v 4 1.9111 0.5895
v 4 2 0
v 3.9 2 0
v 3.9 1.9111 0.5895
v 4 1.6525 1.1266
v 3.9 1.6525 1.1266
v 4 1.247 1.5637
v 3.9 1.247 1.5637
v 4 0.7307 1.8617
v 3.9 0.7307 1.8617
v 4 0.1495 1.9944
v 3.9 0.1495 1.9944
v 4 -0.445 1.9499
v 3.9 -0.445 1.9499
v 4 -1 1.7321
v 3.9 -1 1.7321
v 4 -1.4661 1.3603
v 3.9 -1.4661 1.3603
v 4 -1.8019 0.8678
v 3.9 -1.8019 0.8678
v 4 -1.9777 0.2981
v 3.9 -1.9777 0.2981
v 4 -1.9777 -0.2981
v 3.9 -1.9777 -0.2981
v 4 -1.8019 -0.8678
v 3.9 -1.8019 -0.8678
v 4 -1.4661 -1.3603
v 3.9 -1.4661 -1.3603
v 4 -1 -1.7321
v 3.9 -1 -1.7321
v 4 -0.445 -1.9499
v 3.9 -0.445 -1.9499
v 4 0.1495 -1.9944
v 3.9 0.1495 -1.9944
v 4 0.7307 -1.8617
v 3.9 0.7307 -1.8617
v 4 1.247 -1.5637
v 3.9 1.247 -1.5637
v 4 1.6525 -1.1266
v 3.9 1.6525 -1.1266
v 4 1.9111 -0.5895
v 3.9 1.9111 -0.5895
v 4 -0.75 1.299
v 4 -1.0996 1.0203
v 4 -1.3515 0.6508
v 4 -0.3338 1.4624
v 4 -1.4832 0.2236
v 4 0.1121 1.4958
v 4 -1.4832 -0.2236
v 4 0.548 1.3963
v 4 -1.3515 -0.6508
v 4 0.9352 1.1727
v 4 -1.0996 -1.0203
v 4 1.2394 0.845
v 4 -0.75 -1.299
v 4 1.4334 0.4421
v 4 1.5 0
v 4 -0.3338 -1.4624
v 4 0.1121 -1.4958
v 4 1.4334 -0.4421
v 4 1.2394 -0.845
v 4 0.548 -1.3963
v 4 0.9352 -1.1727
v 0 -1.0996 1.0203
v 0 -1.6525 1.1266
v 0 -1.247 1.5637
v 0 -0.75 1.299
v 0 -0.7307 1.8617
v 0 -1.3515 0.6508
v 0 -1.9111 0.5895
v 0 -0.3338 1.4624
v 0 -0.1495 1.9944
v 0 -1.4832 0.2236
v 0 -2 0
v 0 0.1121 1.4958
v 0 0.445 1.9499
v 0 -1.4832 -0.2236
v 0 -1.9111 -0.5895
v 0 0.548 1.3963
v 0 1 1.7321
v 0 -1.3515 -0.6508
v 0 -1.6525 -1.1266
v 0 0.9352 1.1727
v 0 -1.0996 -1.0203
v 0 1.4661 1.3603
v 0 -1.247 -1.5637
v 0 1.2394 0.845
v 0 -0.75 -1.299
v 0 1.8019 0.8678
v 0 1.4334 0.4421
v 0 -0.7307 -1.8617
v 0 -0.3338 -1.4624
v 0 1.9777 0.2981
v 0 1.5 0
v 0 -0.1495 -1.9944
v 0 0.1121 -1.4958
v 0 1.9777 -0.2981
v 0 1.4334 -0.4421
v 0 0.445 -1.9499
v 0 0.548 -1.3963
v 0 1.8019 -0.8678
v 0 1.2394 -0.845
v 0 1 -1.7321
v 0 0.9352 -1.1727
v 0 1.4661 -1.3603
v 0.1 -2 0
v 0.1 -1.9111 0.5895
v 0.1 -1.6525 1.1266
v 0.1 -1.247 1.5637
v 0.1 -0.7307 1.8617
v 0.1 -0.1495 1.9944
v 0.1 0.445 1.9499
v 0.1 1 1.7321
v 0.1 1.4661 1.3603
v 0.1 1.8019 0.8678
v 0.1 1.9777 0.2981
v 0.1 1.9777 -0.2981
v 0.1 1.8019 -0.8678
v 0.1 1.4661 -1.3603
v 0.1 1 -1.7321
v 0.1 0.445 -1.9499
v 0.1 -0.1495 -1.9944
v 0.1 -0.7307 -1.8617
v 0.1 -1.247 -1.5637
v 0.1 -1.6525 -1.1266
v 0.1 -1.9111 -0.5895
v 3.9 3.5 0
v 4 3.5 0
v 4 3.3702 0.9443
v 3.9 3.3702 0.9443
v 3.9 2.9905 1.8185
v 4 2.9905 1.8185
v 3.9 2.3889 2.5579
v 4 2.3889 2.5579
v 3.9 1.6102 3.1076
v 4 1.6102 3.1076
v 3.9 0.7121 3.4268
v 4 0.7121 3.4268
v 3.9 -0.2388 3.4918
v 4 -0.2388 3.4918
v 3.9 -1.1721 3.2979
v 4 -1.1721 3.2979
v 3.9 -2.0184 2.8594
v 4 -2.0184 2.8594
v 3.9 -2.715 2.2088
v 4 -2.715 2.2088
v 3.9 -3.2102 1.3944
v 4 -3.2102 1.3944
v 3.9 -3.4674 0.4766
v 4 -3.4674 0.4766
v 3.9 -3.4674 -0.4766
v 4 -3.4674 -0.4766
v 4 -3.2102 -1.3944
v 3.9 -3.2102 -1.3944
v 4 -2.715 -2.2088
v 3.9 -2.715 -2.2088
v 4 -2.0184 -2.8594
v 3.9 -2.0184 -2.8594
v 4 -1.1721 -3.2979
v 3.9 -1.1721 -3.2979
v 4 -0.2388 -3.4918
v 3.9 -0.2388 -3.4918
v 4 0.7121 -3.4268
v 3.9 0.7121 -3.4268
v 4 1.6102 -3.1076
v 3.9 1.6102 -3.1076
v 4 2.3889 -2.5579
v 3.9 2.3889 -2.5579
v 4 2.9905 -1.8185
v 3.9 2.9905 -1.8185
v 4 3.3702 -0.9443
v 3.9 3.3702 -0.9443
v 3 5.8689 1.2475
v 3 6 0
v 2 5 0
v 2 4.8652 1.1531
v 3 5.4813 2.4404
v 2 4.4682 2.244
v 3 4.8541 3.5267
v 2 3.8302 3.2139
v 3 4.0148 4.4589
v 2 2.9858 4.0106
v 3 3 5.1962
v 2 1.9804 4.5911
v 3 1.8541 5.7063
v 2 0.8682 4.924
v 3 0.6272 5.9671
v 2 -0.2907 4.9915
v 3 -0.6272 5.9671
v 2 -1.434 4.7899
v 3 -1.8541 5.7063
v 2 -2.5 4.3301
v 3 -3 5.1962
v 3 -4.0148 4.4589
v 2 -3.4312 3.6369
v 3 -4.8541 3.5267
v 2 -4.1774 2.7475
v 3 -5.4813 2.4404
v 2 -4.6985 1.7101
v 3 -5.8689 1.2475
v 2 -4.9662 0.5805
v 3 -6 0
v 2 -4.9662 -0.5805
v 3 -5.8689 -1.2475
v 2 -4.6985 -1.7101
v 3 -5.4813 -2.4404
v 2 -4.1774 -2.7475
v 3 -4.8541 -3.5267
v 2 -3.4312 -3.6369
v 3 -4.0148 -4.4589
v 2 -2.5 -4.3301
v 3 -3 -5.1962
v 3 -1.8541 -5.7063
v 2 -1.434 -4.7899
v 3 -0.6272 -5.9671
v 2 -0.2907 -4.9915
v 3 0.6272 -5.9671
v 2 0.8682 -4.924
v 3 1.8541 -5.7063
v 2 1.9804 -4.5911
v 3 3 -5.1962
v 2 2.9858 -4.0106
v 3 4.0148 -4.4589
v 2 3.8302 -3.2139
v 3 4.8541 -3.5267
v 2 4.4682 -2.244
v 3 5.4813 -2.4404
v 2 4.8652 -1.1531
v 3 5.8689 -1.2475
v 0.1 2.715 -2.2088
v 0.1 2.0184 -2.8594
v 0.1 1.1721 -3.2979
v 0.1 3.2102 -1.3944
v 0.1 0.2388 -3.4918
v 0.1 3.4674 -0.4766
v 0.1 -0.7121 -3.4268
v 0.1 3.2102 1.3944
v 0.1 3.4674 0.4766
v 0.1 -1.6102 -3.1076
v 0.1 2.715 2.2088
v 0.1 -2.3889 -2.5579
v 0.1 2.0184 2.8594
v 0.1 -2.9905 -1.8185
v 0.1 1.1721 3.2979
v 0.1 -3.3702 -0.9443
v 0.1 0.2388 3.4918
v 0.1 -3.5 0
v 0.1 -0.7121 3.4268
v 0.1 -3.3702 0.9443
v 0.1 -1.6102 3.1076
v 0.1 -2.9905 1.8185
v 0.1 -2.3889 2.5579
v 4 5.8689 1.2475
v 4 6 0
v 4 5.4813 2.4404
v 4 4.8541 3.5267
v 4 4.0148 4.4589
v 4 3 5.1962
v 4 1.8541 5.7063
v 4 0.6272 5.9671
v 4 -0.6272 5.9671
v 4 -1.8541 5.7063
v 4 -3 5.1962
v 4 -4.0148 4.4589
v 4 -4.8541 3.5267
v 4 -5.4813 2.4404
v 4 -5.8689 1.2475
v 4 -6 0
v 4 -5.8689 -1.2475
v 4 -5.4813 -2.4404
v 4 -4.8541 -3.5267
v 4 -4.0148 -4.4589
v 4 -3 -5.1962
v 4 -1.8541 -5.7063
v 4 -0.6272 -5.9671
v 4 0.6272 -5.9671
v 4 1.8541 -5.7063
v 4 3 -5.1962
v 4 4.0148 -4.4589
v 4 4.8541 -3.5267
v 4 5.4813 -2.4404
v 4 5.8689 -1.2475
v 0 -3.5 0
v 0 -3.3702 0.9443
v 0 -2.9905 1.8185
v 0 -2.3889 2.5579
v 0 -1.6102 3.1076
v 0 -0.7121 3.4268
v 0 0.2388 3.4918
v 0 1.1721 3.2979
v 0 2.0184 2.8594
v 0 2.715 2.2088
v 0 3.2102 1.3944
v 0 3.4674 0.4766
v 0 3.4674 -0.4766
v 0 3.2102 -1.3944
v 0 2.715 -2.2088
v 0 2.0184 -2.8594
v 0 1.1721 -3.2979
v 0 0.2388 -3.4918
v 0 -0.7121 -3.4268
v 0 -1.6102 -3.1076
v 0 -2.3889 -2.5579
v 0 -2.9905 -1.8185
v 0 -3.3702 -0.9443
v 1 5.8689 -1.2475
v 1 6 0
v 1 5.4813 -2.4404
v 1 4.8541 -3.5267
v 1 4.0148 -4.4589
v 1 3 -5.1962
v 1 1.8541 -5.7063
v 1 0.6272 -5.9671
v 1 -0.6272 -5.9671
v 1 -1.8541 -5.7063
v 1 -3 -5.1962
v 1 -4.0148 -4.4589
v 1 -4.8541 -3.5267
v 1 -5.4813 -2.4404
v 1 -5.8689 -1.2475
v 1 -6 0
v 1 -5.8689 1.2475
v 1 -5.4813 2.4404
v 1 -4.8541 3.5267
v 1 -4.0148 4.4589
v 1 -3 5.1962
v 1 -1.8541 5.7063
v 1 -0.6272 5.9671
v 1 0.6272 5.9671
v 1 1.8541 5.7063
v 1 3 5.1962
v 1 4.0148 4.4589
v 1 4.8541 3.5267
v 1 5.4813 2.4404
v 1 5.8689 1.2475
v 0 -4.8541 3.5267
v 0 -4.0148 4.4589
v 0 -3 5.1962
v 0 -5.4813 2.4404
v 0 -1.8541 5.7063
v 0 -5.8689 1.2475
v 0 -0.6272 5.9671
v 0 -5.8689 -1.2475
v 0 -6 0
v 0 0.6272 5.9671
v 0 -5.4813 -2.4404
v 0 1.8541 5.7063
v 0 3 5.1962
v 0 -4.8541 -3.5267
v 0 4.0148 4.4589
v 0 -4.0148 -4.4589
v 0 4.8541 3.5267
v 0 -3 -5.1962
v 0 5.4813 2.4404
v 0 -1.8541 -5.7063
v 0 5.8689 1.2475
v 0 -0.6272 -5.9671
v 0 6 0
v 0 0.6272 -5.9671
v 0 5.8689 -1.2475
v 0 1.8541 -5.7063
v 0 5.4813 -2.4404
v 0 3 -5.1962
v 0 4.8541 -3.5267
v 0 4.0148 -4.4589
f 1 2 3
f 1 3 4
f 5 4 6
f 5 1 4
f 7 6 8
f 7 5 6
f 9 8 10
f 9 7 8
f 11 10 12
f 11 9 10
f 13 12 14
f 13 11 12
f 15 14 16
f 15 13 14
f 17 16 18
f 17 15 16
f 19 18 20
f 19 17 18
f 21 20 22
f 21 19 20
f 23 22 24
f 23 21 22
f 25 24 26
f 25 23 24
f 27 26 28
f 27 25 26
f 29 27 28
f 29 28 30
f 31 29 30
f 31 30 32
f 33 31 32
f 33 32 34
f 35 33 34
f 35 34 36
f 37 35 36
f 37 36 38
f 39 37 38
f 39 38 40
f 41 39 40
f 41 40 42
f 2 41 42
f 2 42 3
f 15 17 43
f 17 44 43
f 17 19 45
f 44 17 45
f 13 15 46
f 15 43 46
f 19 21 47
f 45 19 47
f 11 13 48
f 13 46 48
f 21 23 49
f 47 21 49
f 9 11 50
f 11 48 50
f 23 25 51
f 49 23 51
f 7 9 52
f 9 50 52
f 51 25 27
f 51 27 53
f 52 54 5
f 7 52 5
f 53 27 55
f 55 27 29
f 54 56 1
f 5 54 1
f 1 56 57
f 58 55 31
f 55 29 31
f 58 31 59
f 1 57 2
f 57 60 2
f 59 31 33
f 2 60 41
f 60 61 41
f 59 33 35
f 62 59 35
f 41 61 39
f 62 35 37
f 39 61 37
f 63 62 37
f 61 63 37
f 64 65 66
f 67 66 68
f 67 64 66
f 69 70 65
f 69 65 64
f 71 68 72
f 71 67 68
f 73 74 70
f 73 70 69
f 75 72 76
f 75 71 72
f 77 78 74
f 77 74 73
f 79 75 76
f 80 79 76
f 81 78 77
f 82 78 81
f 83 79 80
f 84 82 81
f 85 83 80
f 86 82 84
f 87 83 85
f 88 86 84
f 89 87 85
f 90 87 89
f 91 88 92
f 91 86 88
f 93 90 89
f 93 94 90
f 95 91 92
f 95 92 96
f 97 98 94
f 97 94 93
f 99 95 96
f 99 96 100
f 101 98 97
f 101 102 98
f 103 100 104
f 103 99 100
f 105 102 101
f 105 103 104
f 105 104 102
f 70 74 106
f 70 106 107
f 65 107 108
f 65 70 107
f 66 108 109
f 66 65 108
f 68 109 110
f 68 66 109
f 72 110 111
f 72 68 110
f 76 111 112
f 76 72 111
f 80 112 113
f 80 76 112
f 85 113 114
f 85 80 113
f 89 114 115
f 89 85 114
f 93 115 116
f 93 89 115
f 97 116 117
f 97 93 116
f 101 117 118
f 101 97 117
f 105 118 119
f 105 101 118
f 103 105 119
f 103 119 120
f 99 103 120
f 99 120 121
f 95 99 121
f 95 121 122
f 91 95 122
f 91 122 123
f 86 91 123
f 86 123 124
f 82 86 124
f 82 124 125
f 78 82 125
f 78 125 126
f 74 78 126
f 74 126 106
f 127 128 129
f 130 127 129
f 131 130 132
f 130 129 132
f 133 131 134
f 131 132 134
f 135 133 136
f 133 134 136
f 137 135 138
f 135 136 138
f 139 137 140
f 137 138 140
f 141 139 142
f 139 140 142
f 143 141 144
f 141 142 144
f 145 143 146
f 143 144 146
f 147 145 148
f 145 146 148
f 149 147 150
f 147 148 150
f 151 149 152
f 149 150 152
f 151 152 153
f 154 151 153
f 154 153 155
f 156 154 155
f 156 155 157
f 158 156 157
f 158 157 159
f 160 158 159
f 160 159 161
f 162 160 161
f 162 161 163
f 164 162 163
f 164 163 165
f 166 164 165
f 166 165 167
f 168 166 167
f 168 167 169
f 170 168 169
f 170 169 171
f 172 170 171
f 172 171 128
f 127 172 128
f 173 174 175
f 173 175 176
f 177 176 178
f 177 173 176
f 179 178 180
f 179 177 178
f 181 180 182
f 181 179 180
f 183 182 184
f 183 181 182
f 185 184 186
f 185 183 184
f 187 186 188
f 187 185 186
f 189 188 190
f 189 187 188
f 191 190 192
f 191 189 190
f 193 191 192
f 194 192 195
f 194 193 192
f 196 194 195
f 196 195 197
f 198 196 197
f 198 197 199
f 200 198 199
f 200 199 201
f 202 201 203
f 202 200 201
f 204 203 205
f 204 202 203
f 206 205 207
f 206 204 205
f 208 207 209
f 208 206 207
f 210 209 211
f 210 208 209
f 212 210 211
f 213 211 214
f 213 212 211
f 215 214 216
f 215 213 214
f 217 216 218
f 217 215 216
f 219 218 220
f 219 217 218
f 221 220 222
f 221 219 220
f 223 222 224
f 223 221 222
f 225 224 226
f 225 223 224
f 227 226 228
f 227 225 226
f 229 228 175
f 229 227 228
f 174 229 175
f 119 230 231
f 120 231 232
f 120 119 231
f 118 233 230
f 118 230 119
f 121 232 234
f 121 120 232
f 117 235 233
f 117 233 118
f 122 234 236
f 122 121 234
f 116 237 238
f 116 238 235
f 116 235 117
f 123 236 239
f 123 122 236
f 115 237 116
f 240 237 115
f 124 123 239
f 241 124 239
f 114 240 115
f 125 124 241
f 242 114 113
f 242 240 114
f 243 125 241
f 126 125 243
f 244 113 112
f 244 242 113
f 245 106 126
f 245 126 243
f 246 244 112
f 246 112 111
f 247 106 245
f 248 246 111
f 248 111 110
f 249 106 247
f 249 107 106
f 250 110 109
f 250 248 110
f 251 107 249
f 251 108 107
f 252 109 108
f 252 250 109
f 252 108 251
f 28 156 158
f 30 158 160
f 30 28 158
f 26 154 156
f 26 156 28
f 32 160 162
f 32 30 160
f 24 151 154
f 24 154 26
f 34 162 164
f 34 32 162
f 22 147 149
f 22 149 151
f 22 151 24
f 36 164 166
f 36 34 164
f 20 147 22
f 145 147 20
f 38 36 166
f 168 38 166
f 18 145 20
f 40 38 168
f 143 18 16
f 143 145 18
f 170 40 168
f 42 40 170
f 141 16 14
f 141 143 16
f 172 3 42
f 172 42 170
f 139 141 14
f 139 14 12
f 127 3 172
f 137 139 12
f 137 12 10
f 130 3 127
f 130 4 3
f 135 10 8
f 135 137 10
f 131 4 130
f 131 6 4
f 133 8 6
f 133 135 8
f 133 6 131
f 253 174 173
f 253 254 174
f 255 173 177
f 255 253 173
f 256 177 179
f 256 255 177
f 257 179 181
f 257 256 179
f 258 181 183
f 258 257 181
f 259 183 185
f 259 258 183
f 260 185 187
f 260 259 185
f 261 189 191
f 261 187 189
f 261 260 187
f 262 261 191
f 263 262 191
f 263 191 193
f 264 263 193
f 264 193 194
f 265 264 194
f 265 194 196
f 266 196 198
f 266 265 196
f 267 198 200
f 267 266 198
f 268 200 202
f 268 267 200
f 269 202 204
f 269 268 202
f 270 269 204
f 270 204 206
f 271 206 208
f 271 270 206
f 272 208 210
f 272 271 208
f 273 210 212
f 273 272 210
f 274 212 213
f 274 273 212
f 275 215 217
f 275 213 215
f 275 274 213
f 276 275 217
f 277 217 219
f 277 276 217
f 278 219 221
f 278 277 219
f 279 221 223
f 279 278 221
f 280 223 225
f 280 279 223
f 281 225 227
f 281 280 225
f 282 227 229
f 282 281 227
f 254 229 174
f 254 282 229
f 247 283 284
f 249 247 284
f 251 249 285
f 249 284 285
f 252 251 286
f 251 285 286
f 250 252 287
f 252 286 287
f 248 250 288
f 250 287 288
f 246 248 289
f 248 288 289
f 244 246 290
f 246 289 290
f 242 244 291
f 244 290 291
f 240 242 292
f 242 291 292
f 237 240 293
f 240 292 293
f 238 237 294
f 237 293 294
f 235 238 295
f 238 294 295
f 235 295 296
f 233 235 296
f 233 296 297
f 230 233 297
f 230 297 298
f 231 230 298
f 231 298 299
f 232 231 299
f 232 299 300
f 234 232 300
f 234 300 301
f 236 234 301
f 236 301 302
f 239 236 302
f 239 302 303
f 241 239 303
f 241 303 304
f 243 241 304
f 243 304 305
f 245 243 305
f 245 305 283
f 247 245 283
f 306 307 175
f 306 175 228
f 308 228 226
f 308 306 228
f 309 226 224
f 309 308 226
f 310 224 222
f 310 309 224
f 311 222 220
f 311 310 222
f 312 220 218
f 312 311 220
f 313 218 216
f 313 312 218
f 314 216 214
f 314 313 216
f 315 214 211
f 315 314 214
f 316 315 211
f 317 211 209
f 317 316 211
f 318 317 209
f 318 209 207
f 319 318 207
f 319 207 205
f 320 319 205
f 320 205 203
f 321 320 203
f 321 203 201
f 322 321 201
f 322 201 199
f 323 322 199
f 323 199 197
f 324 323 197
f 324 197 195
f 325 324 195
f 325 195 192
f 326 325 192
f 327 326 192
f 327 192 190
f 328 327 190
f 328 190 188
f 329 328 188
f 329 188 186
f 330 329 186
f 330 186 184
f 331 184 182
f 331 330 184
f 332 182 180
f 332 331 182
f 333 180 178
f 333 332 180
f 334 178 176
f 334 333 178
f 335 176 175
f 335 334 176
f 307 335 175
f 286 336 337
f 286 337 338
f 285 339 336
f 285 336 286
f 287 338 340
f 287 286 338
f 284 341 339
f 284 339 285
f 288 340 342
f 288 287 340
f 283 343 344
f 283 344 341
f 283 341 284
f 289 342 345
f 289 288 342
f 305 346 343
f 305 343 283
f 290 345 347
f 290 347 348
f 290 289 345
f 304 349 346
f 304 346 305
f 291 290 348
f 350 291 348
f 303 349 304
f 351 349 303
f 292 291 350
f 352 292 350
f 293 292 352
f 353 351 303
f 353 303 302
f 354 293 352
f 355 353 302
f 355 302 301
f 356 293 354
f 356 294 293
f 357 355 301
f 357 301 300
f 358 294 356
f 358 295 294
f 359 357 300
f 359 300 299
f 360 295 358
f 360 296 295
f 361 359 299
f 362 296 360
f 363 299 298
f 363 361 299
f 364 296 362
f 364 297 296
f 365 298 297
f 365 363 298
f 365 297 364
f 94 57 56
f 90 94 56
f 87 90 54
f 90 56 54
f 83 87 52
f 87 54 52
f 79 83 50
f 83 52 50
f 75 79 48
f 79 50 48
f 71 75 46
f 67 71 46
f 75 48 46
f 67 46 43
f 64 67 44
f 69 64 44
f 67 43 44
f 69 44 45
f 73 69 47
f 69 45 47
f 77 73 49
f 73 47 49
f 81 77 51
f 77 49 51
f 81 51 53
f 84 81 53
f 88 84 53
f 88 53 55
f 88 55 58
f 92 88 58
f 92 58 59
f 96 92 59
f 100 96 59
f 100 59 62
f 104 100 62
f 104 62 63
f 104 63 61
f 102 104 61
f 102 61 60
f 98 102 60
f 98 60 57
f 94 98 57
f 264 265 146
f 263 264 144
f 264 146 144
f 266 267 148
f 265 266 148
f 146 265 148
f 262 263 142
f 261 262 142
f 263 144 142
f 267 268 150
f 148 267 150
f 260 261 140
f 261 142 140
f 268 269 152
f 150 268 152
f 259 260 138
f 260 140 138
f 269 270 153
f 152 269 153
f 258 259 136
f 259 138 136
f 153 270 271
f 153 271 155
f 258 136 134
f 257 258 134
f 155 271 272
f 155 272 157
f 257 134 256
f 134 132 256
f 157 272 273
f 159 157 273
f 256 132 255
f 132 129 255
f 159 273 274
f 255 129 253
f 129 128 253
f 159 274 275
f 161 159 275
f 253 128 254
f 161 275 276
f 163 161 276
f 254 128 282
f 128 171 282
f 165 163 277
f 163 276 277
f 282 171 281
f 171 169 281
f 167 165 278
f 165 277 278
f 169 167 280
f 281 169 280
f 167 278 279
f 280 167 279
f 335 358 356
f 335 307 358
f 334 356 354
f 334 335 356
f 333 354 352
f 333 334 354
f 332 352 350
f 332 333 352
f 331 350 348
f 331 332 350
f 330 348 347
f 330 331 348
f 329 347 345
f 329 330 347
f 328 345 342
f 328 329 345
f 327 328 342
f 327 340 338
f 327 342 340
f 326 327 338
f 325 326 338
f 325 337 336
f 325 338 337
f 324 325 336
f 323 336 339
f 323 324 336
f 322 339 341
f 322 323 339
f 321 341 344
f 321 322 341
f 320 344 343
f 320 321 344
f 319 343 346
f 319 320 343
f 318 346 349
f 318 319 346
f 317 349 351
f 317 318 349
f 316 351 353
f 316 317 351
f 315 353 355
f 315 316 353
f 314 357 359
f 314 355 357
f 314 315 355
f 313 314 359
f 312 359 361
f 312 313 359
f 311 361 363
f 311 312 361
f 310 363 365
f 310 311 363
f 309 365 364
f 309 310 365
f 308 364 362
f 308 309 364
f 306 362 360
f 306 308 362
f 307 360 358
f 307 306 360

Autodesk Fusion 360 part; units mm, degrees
sketch "Sketch2" plane through (0, 0, 0) normal (0, 0, 1) x (1, 0, 0)
  line L0 (0, 0) -> (0, 6)
  line L1 (4, 6) -> (4, 0)
  line L2 (4, 0) -> (0, 0)
  line L3 (1, 6) -> (2, 5)
  line L4 (2, 5) -> (3, 6)
  line L5 (0, 6) -> (1, 6)
  line L6 (3, 6) -> (4, 6)
  dimension "d12" = 4
  dimension "d13" = 1
  dimension "d14" = 1
  dimension "d15" = 6
revolve "Revolve1" add sketch "Sketch2" angle 360 about axis through (4, 0, 0) along (-1, 0, 0)
sketch "Sketch3" plane through (4, 0, 0) normal (1, 0, 0) x (0, 1, 0)
  circle A0 centre (0, 0) radius 6
  circle A1 centre (0, 0) radius 1.5
  dimension "d18" = 3
extrude "Extrude2" cut sketch "Sketch3" against normal through all contours A1
sketch "Sketch4" plane through (4, 0, 0) normal (1, 0, 0) x (0, 1, 0)
  circle A0 centre (0, 0) radius 1.5
  circle A1 centre (0, 0) radius 6
  circle A2 centre (0, 0) radius 3.5
  circle A3 centre (0, 0) radius 2
  dimension "d20" = 7
  dimension "d21" = 4
extrude "Extrude3" cut sketch "Sketch4" against normal blind 0.1 contours A2
sketch "Sketch5" plane through (0, 0, 0) normal (-1, 0, 0) x (0, -1, 0)
  circle A0 centre (0, 0) radius 1.5
  circle A1 centre (0, 0) radius 6
  circle A2 centre (0, 0) radius 2
  circle A3 centre (0, 0) radius 3.5
  dimension "d24" = 7
  dimension "d25" = 4
extrude "Extrude4" cut sketch "Sketch5" against normal blind 0.1 contours A3
